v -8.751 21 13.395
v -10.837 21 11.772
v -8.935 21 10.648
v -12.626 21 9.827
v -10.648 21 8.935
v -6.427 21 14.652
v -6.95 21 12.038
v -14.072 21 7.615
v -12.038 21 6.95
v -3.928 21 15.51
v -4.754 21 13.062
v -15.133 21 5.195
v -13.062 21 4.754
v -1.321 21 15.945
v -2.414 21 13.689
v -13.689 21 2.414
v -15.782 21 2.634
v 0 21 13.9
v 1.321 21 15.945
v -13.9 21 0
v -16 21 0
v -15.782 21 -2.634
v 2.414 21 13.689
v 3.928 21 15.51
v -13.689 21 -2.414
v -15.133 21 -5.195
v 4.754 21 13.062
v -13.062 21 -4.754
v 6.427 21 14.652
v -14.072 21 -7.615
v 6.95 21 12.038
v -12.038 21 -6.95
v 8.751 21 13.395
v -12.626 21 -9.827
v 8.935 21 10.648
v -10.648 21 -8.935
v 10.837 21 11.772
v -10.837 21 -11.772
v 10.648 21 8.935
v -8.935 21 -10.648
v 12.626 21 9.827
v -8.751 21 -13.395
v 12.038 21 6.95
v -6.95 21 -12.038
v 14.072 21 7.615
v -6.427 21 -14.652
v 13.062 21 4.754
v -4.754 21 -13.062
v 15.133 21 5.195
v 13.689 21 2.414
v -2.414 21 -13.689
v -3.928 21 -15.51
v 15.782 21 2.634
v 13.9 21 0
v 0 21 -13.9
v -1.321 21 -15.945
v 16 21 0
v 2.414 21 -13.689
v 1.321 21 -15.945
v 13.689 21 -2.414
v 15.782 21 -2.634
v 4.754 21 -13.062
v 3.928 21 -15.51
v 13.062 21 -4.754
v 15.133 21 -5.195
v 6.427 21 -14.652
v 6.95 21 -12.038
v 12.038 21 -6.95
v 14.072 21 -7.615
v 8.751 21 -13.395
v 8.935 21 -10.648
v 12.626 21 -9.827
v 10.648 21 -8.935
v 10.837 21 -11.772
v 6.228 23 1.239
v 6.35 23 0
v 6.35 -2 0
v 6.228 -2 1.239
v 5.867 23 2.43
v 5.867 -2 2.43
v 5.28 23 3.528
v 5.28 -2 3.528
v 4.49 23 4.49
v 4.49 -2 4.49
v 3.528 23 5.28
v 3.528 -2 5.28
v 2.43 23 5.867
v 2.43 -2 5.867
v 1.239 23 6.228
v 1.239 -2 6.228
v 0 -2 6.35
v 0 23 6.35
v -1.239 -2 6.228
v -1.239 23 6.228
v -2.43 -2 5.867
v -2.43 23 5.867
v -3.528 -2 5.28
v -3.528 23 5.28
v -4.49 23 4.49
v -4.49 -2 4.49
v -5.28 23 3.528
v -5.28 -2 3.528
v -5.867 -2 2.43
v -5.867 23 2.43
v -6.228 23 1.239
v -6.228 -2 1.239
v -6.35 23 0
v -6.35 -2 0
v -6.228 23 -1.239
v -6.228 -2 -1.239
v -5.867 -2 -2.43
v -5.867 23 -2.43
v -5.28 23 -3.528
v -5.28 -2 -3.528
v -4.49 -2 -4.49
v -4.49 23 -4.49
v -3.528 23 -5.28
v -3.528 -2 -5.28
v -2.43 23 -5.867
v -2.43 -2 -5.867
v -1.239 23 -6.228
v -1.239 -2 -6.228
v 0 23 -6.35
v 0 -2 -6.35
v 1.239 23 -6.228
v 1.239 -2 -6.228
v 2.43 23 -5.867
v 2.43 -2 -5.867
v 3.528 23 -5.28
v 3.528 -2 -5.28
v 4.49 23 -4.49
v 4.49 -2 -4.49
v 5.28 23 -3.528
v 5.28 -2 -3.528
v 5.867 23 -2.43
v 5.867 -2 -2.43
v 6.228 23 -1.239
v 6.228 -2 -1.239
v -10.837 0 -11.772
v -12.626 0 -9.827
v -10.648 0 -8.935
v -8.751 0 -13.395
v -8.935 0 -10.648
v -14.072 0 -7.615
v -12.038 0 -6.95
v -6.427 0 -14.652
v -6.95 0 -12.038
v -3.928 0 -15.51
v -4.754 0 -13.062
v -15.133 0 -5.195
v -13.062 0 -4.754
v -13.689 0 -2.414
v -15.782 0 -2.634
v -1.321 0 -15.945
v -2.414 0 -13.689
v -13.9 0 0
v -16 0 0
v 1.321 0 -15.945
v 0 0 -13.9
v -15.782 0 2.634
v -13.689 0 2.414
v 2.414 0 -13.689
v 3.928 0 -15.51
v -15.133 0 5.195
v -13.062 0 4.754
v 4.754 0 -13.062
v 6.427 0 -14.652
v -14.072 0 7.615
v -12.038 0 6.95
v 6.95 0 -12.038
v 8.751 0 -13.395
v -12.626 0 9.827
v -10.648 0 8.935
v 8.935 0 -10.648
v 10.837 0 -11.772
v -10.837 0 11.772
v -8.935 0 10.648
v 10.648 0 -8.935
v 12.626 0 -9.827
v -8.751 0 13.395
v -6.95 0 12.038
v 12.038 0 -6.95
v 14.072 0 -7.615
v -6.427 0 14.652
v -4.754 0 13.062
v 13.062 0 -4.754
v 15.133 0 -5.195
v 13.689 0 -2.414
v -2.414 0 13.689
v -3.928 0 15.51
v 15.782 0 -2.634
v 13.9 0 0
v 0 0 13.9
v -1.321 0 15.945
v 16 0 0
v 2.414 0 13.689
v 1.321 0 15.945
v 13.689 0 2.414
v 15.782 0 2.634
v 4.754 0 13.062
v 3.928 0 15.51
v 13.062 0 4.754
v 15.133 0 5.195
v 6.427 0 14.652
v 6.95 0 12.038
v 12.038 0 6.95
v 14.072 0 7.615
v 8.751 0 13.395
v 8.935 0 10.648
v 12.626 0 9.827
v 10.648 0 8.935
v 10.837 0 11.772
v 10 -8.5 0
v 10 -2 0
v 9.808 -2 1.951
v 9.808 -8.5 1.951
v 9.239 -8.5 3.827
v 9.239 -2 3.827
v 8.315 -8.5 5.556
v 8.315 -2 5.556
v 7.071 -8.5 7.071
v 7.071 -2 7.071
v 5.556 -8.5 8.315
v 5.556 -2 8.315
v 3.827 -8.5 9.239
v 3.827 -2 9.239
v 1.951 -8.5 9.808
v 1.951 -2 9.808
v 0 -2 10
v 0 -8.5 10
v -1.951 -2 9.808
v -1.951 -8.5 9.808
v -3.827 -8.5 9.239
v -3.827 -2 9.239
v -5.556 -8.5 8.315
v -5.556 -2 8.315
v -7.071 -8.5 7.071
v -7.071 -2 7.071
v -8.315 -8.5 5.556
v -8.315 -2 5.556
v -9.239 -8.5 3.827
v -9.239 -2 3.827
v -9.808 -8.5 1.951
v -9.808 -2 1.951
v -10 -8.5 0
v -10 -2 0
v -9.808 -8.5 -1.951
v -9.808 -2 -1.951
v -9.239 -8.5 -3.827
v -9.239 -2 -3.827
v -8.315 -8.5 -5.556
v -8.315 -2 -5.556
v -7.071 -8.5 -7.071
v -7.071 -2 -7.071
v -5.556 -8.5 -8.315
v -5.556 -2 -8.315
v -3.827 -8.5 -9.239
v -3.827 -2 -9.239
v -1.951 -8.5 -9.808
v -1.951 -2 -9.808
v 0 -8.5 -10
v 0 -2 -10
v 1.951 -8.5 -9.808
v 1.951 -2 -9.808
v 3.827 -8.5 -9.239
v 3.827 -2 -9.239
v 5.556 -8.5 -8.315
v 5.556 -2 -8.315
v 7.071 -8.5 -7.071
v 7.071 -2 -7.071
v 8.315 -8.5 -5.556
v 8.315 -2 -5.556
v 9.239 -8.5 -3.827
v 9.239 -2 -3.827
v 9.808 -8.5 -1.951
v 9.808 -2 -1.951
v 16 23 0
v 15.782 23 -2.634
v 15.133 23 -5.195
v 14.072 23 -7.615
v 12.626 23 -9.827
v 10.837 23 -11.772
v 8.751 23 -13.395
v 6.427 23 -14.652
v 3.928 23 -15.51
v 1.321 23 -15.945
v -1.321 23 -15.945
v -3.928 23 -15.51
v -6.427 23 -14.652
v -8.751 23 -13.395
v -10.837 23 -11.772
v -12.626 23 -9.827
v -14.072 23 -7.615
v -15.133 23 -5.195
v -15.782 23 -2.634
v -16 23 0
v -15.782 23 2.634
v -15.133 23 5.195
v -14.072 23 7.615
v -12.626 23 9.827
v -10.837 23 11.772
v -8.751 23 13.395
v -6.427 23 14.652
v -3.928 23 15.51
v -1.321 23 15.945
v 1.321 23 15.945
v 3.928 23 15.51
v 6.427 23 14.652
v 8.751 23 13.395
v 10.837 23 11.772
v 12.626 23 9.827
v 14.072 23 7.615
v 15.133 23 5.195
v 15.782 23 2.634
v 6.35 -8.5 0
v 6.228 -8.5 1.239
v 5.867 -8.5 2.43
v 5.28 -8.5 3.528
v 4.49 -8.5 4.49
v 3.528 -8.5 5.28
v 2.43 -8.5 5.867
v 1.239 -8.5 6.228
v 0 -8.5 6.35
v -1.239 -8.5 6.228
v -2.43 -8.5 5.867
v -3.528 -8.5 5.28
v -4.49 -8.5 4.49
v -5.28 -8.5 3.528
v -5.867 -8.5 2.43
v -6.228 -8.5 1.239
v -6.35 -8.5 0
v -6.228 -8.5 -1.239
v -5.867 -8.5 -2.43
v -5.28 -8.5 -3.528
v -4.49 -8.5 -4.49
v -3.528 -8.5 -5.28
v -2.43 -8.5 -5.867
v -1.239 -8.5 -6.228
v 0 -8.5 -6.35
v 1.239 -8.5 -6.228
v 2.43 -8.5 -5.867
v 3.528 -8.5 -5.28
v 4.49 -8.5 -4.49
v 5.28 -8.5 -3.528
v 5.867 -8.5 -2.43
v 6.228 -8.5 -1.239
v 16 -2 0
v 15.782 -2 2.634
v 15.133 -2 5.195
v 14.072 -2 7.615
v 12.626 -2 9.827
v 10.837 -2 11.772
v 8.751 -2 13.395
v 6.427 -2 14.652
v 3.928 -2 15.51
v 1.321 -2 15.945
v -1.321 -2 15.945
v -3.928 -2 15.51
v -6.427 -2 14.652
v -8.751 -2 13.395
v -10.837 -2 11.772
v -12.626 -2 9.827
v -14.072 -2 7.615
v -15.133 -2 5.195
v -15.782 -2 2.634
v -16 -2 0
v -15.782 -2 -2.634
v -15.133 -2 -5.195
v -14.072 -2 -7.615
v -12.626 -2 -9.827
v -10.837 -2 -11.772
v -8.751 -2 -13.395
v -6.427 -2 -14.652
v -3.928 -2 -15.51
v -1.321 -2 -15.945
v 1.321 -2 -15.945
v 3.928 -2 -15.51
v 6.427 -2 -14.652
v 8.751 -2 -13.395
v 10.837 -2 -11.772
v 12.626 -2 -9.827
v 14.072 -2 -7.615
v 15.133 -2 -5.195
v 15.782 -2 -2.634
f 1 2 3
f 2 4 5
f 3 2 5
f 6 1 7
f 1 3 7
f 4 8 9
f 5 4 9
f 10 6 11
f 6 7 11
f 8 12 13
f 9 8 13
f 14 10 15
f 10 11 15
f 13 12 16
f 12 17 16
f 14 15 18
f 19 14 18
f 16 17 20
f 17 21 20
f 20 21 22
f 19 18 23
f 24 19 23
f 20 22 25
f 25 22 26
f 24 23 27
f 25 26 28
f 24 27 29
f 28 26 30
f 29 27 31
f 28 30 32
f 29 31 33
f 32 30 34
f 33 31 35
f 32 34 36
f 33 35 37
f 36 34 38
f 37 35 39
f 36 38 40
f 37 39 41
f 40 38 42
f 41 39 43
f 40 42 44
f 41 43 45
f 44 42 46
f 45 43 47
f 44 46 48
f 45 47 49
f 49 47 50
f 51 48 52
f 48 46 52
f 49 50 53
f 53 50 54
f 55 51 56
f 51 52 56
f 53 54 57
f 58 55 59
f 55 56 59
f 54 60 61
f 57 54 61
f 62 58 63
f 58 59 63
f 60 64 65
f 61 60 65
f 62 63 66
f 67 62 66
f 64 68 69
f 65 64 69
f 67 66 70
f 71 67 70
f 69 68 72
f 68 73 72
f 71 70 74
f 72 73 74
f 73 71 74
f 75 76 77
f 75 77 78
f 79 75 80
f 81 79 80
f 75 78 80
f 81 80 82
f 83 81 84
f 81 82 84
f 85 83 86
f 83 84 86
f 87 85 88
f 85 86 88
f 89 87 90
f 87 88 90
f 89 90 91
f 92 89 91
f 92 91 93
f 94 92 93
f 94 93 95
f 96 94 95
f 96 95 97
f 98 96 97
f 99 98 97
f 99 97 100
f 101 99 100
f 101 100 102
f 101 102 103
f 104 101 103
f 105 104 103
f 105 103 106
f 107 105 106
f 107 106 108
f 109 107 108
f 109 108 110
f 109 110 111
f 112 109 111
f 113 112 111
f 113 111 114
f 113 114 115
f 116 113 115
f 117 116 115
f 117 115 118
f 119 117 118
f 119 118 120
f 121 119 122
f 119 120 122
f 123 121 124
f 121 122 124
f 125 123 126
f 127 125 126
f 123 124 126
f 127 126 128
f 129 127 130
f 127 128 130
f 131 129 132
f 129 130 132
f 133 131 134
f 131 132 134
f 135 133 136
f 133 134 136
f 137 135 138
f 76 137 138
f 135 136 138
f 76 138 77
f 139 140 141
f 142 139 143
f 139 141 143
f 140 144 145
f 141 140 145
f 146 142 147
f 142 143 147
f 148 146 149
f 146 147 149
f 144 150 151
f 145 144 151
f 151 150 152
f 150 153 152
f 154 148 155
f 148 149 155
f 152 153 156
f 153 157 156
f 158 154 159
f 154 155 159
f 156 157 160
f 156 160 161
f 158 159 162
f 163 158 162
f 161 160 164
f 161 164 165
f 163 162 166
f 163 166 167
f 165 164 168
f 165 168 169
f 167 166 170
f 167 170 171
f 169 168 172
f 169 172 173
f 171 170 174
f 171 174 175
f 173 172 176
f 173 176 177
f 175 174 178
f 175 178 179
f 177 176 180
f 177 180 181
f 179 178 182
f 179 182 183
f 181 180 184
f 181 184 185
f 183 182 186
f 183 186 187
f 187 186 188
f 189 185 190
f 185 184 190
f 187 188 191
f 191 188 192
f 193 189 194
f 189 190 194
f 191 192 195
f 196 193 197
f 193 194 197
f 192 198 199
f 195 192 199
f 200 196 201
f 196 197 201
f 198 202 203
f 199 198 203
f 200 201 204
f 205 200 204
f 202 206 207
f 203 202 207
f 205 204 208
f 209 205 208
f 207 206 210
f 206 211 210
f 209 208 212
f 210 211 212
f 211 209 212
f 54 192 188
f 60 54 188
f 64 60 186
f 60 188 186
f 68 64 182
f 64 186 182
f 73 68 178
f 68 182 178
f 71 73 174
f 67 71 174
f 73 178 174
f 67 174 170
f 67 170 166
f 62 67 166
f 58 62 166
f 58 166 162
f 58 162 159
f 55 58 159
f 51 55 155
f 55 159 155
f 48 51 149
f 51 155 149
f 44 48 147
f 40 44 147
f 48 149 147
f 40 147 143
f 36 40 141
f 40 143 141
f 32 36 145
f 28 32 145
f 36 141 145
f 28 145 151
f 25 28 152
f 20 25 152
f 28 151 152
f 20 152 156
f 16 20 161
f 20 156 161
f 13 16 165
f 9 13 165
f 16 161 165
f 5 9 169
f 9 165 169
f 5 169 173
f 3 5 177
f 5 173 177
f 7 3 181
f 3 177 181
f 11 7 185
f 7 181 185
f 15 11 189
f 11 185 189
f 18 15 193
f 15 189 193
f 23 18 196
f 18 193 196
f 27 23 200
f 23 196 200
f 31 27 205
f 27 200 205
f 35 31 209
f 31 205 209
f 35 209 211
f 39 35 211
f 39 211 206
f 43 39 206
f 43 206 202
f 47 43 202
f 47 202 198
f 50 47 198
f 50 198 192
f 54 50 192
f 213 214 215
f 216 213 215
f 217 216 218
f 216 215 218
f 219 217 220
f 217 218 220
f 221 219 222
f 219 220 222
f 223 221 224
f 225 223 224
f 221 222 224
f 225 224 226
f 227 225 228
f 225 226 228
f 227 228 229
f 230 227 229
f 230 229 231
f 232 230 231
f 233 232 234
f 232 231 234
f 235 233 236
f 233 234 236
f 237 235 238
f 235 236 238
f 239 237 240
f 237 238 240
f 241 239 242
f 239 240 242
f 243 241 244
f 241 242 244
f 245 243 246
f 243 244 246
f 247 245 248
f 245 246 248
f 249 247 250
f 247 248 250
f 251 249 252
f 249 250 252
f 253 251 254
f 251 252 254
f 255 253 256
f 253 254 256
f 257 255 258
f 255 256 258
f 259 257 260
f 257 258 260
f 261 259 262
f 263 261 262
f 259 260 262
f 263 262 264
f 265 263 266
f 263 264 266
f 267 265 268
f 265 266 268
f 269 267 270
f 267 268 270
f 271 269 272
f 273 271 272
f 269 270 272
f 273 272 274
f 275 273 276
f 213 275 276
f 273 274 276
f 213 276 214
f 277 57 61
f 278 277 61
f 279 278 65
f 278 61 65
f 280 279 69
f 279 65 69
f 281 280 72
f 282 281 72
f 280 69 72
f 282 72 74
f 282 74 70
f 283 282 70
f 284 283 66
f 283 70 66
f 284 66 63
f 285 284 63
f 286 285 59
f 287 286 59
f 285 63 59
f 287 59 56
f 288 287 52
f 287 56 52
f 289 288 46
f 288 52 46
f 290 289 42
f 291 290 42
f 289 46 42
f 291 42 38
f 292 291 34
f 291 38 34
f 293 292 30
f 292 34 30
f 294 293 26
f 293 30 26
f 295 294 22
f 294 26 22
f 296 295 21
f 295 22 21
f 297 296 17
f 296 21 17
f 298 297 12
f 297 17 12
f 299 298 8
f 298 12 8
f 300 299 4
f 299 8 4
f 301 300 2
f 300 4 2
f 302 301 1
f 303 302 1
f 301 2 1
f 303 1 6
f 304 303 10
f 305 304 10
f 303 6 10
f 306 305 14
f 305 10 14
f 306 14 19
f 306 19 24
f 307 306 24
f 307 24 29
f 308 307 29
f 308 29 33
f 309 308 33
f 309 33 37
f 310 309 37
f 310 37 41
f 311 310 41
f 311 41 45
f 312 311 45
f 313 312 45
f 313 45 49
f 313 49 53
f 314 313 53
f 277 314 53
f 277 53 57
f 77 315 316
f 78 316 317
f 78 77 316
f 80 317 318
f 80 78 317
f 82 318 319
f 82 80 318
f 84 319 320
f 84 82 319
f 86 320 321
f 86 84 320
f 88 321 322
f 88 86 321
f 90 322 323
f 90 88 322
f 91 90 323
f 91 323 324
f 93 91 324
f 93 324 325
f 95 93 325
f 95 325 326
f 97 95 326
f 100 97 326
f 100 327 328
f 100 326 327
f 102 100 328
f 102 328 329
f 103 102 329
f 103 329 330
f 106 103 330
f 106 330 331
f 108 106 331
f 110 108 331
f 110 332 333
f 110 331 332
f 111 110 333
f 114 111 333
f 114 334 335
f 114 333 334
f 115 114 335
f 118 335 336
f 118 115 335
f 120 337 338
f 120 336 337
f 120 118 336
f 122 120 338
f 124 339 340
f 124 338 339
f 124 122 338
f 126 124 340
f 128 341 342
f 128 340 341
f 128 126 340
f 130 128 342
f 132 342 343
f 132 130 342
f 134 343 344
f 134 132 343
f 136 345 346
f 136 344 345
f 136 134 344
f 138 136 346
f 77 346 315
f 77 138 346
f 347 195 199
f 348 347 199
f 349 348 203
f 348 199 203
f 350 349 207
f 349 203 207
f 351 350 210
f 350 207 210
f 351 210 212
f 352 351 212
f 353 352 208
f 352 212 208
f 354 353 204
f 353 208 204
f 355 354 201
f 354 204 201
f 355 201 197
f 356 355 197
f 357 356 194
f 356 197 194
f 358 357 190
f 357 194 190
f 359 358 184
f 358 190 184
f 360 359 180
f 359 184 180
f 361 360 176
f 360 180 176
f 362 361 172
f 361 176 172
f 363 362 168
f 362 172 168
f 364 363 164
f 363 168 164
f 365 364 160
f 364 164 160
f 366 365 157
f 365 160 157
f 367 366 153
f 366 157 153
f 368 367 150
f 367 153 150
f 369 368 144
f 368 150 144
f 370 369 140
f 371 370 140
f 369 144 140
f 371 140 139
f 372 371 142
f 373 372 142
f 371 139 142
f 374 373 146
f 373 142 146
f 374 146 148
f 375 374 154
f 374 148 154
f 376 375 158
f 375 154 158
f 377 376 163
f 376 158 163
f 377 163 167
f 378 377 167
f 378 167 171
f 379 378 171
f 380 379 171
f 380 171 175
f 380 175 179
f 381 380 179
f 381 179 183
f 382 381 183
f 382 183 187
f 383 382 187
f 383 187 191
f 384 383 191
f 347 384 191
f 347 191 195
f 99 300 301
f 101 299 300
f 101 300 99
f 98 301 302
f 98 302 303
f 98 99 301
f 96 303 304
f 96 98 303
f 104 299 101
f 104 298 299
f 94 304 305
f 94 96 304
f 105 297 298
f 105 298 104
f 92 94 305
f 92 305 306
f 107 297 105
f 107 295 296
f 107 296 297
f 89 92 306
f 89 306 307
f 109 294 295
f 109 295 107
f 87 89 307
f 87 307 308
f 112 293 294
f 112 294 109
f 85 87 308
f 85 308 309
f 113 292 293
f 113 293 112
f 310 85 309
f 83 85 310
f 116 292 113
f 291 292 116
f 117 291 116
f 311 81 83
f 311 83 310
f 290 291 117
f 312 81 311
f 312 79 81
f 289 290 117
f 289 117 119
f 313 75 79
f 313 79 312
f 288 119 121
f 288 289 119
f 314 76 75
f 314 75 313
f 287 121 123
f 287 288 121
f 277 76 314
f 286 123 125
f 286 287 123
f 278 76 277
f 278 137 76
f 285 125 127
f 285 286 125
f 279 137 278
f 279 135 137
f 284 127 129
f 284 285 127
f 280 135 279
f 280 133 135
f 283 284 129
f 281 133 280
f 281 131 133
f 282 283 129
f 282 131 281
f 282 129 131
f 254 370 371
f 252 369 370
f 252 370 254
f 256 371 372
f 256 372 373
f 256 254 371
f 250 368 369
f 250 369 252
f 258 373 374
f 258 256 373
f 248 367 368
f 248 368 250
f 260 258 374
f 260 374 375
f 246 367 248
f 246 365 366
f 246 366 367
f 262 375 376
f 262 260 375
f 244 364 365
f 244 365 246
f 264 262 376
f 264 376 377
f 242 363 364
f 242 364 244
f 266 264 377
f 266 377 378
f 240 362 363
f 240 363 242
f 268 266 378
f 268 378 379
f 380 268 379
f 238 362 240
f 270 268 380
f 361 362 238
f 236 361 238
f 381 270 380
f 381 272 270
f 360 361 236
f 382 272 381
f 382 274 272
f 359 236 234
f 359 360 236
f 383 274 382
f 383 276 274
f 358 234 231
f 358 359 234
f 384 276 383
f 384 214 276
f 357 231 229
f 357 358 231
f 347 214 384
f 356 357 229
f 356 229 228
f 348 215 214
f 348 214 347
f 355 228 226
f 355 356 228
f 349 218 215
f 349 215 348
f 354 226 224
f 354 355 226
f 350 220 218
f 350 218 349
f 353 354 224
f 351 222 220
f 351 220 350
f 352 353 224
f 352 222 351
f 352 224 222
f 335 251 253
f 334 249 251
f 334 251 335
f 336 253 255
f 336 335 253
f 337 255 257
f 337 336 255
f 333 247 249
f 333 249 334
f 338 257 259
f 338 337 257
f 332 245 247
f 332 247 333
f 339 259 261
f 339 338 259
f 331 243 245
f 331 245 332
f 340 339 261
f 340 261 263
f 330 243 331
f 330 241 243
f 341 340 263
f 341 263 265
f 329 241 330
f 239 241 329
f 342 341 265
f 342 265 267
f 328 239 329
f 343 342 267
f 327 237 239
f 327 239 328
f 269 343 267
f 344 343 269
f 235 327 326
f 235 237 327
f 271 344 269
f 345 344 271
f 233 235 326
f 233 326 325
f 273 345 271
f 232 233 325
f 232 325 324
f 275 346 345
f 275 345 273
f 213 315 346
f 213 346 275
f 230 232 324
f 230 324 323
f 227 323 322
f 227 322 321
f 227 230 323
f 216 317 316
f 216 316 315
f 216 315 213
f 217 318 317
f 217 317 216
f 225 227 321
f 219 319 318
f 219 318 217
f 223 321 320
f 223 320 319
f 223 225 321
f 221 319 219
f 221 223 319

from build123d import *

# Parameters (mm, degrees)
SKETCH1_R               = 13.9
BOSS_EXTRUDE1_DEPTH     = 21
SKETCH2_R               = 16
BOSS_EXTRUDE2_DEPTH     = 2
SKETCH3_R               = 16
BOSS_EXTRUDE3_DEPTH     = 2
SKETCH5_R               = 10
SKETCH5_R_2             = 3
BOSS_EXTRUDE4_DEPTH     = 6.5
SKETCH4_R               = 6.35
CUT_EXTRUDE1_DEPTH      = 10
CUT_EXTRUDE1_DEPTH_BACK = 26


with BuildPart() as part:
    # Sketch1 → Boss-Extrude1 (new body)
    with BuildSketch(Plane(origin=(0, 0, 0), x_dir=(1, 0, 0), z_dir=(0, 1, 0))):
        Circle(SKETCH1_R)
    extrude(amount=BOSS_EXTRUDE1_DEPTH)

    # Sketch2 → Boss-Extrude2 (add)
    with BuildSketch(Plane(origin=(0, 21, 0), x_dir=(1, 0, 0), z_dir=(0, 1, 0))):
        Circle(SKETCH2_R)
    extrude(amount=BOSS_EXTRUDE2_DEPTH)

    # Sketch3 → Boss-Extrude3 (add)
    with BuildSketch(Plane.XZ):
        Circle(SKETCH3_R)
    extrude(amount=BOSS_EXTRUDE3_DEPTH)

    # Sketch5 → Boss-Extrude4 (add)
    with BuildSketch(Plane.XZ.offset(2)):
        Circle(SKETCH5_R)
        Circle(SKETCH5_R_2, mode=Mode.SUBTRACT)
    extrude(amount=BOSS_EXTRUDE4_DEPTH)

    # Sketch4 → Cut-Extrude1 (cut, two sides)
    with BuildSketch(Plane.XZ.offset(2)) as cut_extrude1_sk:
        Circle(SKETCH4_R)
    extrude(amount=CUT_EXTRUDE1_DEPTH, mode=Mode.SUBTRACT)
    extrude(cut_extrude1_sk.sketch, amount=-CUT_EXTRUDE1_DEPTH_BACK, mode=Mode.SUBTRACT)


solid = part.part
